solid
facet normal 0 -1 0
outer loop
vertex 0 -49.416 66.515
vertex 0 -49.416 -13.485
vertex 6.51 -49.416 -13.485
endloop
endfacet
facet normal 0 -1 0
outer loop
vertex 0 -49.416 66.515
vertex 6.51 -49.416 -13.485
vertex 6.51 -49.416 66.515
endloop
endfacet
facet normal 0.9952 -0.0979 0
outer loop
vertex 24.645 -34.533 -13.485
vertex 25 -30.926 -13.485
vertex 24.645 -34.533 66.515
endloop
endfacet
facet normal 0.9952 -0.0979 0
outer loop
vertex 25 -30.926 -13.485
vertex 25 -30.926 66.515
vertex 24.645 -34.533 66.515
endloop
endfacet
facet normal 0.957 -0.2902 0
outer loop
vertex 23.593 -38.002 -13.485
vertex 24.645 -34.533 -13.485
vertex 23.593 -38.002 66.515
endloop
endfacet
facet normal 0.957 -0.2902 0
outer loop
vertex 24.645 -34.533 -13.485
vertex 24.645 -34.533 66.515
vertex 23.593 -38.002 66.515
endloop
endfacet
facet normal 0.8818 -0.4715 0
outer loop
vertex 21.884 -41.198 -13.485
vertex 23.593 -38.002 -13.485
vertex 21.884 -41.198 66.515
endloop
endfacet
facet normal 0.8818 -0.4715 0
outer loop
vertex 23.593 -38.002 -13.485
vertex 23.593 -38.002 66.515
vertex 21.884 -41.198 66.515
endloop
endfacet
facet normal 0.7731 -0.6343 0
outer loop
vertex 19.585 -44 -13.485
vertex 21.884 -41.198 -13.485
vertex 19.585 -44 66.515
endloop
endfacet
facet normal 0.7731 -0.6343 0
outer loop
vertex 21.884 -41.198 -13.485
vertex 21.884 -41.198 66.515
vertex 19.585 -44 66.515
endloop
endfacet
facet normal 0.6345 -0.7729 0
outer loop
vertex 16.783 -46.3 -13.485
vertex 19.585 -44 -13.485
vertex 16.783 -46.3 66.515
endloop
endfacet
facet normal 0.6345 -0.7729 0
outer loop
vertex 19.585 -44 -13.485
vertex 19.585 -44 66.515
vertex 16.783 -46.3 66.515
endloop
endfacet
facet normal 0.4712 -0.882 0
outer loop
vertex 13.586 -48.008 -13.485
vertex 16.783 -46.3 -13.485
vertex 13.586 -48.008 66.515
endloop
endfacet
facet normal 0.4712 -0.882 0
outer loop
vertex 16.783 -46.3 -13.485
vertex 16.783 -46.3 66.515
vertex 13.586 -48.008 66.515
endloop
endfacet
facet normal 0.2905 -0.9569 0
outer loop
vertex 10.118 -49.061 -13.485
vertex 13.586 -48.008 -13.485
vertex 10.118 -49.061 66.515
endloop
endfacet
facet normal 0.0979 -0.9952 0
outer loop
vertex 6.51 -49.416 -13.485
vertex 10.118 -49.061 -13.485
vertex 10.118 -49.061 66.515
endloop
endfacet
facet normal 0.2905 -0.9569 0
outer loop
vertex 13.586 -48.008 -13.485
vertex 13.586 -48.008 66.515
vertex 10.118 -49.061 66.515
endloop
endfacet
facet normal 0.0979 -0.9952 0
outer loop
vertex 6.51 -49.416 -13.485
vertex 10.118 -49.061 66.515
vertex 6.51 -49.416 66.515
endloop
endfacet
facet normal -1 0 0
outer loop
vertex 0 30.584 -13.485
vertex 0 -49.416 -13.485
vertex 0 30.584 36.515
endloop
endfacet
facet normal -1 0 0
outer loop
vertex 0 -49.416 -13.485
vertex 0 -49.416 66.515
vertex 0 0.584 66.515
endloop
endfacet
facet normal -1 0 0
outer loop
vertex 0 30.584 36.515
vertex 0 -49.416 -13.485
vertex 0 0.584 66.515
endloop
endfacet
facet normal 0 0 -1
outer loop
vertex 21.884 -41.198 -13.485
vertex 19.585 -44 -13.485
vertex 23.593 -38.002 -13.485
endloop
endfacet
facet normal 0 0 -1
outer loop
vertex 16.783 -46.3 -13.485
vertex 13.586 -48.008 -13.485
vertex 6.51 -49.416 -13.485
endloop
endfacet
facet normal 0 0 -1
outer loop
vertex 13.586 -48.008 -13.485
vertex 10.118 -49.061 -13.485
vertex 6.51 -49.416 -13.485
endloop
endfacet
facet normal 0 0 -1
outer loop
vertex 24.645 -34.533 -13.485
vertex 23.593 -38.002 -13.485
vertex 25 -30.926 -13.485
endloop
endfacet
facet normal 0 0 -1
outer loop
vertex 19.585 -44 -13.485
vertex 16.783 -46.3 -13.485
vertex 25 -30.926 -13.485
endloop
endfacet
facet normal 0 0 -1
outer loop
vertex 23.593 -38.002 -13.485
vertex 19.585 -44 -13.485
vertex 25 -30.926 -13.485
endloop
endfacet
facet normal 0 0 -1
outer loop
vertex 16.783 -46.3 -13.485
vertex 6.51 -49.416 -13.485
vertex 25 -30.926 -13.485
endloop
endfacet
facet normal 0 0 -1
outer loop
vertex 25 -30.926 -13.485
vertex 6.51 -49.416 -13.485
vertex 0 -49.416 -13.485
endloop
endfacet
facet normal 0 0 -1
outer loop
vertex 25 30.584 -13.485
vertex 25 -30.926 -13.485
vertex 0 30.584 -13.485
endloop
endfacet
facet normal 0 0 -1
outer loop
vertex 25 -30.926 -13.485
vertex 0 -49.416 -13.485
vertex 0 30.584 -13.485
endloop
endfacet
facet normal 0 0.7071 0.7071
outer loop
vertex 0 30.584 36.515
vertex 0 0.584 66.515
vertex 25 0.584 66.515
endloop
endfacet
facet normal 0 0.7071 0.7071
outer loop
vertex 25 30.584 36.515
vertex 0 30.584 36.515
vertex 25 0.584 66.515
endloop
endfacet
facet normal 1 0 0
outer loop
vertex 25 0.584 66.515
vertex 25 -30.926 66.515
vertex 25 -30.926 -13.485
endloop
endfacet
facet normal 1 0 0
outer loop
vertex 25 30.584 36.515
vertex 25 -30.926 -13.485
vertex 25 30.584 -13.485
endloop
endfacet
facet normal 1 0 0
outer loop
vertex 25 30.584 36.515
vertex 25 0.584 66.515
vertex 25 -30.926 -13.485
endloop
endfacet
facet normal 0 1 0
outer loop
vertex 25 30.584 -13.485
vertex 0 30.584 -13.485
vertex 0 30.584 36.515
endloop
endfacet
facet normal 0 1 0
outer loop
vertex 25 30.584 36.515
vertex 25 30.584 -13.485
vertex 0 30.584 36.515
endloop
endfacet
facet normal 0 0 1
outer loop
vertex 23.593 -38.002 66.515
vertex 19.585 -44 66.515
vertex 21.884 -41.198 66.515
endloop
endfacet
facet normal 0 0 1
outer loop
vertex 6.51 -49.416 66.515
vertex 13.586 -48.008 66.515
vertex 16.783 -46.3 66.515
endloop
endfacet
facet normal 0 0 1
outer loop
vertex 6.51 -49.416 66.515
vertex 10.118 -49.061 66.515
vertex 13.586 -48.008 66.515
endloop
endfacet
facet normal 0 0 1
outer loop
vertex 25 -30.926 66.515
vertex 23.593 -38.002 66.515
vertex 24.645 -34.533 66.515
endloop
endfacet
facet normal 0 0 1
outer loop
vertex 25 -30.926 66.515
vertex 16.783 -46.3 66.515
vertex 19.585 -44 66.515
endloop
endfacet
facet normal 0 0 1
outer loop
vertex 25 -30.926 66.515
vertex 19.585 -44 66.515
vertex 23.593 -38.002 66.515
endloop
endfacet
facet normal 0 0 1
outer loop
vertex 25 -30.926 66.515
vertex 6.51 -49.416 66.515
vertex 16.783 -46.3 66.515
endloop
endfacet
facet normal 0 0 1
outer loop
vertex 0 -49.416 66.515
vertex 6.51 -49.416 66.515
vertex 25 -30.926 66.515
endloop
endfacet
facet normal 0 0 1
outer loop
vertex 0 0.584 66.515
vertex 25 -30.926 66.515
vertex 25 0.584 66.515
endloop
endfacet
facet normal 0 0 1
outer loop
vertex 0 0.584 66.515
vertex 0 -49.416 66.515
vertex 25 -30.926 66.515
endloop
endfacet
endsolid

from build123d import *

# Parameters (mm, degrees)
F0_W     = 80
F0_H     = 80
F1_DEPTH = 25
F2_SIZE  = 30
F3_R     = 18.489641


with BuildPart() as f1:
    # F0 (on Right) → F1 (new body)
    with BuildSketch(Plane.YZ):
        with Locations((-9.415843, 26.514679)):
            Rectangle(F0_W, F0_H)
    extrude(amount=F1_DEPTH)

    # F2
    f2_edges = [f1.edges().sort_by_distance(p)[0] for p in [
        (12.5, 30.584157, 66.514679),
    ]]
    chamfer(f2_edges, length=F2_SIZE)

    # F3
    f3_edges = [f1.edges().sort_by_distance(p)[0] for p in [
        (25, -49.415843, 26.514679),
    ]]
    fillet(f3_edges, radius=F3_R)


solid = f1.part
